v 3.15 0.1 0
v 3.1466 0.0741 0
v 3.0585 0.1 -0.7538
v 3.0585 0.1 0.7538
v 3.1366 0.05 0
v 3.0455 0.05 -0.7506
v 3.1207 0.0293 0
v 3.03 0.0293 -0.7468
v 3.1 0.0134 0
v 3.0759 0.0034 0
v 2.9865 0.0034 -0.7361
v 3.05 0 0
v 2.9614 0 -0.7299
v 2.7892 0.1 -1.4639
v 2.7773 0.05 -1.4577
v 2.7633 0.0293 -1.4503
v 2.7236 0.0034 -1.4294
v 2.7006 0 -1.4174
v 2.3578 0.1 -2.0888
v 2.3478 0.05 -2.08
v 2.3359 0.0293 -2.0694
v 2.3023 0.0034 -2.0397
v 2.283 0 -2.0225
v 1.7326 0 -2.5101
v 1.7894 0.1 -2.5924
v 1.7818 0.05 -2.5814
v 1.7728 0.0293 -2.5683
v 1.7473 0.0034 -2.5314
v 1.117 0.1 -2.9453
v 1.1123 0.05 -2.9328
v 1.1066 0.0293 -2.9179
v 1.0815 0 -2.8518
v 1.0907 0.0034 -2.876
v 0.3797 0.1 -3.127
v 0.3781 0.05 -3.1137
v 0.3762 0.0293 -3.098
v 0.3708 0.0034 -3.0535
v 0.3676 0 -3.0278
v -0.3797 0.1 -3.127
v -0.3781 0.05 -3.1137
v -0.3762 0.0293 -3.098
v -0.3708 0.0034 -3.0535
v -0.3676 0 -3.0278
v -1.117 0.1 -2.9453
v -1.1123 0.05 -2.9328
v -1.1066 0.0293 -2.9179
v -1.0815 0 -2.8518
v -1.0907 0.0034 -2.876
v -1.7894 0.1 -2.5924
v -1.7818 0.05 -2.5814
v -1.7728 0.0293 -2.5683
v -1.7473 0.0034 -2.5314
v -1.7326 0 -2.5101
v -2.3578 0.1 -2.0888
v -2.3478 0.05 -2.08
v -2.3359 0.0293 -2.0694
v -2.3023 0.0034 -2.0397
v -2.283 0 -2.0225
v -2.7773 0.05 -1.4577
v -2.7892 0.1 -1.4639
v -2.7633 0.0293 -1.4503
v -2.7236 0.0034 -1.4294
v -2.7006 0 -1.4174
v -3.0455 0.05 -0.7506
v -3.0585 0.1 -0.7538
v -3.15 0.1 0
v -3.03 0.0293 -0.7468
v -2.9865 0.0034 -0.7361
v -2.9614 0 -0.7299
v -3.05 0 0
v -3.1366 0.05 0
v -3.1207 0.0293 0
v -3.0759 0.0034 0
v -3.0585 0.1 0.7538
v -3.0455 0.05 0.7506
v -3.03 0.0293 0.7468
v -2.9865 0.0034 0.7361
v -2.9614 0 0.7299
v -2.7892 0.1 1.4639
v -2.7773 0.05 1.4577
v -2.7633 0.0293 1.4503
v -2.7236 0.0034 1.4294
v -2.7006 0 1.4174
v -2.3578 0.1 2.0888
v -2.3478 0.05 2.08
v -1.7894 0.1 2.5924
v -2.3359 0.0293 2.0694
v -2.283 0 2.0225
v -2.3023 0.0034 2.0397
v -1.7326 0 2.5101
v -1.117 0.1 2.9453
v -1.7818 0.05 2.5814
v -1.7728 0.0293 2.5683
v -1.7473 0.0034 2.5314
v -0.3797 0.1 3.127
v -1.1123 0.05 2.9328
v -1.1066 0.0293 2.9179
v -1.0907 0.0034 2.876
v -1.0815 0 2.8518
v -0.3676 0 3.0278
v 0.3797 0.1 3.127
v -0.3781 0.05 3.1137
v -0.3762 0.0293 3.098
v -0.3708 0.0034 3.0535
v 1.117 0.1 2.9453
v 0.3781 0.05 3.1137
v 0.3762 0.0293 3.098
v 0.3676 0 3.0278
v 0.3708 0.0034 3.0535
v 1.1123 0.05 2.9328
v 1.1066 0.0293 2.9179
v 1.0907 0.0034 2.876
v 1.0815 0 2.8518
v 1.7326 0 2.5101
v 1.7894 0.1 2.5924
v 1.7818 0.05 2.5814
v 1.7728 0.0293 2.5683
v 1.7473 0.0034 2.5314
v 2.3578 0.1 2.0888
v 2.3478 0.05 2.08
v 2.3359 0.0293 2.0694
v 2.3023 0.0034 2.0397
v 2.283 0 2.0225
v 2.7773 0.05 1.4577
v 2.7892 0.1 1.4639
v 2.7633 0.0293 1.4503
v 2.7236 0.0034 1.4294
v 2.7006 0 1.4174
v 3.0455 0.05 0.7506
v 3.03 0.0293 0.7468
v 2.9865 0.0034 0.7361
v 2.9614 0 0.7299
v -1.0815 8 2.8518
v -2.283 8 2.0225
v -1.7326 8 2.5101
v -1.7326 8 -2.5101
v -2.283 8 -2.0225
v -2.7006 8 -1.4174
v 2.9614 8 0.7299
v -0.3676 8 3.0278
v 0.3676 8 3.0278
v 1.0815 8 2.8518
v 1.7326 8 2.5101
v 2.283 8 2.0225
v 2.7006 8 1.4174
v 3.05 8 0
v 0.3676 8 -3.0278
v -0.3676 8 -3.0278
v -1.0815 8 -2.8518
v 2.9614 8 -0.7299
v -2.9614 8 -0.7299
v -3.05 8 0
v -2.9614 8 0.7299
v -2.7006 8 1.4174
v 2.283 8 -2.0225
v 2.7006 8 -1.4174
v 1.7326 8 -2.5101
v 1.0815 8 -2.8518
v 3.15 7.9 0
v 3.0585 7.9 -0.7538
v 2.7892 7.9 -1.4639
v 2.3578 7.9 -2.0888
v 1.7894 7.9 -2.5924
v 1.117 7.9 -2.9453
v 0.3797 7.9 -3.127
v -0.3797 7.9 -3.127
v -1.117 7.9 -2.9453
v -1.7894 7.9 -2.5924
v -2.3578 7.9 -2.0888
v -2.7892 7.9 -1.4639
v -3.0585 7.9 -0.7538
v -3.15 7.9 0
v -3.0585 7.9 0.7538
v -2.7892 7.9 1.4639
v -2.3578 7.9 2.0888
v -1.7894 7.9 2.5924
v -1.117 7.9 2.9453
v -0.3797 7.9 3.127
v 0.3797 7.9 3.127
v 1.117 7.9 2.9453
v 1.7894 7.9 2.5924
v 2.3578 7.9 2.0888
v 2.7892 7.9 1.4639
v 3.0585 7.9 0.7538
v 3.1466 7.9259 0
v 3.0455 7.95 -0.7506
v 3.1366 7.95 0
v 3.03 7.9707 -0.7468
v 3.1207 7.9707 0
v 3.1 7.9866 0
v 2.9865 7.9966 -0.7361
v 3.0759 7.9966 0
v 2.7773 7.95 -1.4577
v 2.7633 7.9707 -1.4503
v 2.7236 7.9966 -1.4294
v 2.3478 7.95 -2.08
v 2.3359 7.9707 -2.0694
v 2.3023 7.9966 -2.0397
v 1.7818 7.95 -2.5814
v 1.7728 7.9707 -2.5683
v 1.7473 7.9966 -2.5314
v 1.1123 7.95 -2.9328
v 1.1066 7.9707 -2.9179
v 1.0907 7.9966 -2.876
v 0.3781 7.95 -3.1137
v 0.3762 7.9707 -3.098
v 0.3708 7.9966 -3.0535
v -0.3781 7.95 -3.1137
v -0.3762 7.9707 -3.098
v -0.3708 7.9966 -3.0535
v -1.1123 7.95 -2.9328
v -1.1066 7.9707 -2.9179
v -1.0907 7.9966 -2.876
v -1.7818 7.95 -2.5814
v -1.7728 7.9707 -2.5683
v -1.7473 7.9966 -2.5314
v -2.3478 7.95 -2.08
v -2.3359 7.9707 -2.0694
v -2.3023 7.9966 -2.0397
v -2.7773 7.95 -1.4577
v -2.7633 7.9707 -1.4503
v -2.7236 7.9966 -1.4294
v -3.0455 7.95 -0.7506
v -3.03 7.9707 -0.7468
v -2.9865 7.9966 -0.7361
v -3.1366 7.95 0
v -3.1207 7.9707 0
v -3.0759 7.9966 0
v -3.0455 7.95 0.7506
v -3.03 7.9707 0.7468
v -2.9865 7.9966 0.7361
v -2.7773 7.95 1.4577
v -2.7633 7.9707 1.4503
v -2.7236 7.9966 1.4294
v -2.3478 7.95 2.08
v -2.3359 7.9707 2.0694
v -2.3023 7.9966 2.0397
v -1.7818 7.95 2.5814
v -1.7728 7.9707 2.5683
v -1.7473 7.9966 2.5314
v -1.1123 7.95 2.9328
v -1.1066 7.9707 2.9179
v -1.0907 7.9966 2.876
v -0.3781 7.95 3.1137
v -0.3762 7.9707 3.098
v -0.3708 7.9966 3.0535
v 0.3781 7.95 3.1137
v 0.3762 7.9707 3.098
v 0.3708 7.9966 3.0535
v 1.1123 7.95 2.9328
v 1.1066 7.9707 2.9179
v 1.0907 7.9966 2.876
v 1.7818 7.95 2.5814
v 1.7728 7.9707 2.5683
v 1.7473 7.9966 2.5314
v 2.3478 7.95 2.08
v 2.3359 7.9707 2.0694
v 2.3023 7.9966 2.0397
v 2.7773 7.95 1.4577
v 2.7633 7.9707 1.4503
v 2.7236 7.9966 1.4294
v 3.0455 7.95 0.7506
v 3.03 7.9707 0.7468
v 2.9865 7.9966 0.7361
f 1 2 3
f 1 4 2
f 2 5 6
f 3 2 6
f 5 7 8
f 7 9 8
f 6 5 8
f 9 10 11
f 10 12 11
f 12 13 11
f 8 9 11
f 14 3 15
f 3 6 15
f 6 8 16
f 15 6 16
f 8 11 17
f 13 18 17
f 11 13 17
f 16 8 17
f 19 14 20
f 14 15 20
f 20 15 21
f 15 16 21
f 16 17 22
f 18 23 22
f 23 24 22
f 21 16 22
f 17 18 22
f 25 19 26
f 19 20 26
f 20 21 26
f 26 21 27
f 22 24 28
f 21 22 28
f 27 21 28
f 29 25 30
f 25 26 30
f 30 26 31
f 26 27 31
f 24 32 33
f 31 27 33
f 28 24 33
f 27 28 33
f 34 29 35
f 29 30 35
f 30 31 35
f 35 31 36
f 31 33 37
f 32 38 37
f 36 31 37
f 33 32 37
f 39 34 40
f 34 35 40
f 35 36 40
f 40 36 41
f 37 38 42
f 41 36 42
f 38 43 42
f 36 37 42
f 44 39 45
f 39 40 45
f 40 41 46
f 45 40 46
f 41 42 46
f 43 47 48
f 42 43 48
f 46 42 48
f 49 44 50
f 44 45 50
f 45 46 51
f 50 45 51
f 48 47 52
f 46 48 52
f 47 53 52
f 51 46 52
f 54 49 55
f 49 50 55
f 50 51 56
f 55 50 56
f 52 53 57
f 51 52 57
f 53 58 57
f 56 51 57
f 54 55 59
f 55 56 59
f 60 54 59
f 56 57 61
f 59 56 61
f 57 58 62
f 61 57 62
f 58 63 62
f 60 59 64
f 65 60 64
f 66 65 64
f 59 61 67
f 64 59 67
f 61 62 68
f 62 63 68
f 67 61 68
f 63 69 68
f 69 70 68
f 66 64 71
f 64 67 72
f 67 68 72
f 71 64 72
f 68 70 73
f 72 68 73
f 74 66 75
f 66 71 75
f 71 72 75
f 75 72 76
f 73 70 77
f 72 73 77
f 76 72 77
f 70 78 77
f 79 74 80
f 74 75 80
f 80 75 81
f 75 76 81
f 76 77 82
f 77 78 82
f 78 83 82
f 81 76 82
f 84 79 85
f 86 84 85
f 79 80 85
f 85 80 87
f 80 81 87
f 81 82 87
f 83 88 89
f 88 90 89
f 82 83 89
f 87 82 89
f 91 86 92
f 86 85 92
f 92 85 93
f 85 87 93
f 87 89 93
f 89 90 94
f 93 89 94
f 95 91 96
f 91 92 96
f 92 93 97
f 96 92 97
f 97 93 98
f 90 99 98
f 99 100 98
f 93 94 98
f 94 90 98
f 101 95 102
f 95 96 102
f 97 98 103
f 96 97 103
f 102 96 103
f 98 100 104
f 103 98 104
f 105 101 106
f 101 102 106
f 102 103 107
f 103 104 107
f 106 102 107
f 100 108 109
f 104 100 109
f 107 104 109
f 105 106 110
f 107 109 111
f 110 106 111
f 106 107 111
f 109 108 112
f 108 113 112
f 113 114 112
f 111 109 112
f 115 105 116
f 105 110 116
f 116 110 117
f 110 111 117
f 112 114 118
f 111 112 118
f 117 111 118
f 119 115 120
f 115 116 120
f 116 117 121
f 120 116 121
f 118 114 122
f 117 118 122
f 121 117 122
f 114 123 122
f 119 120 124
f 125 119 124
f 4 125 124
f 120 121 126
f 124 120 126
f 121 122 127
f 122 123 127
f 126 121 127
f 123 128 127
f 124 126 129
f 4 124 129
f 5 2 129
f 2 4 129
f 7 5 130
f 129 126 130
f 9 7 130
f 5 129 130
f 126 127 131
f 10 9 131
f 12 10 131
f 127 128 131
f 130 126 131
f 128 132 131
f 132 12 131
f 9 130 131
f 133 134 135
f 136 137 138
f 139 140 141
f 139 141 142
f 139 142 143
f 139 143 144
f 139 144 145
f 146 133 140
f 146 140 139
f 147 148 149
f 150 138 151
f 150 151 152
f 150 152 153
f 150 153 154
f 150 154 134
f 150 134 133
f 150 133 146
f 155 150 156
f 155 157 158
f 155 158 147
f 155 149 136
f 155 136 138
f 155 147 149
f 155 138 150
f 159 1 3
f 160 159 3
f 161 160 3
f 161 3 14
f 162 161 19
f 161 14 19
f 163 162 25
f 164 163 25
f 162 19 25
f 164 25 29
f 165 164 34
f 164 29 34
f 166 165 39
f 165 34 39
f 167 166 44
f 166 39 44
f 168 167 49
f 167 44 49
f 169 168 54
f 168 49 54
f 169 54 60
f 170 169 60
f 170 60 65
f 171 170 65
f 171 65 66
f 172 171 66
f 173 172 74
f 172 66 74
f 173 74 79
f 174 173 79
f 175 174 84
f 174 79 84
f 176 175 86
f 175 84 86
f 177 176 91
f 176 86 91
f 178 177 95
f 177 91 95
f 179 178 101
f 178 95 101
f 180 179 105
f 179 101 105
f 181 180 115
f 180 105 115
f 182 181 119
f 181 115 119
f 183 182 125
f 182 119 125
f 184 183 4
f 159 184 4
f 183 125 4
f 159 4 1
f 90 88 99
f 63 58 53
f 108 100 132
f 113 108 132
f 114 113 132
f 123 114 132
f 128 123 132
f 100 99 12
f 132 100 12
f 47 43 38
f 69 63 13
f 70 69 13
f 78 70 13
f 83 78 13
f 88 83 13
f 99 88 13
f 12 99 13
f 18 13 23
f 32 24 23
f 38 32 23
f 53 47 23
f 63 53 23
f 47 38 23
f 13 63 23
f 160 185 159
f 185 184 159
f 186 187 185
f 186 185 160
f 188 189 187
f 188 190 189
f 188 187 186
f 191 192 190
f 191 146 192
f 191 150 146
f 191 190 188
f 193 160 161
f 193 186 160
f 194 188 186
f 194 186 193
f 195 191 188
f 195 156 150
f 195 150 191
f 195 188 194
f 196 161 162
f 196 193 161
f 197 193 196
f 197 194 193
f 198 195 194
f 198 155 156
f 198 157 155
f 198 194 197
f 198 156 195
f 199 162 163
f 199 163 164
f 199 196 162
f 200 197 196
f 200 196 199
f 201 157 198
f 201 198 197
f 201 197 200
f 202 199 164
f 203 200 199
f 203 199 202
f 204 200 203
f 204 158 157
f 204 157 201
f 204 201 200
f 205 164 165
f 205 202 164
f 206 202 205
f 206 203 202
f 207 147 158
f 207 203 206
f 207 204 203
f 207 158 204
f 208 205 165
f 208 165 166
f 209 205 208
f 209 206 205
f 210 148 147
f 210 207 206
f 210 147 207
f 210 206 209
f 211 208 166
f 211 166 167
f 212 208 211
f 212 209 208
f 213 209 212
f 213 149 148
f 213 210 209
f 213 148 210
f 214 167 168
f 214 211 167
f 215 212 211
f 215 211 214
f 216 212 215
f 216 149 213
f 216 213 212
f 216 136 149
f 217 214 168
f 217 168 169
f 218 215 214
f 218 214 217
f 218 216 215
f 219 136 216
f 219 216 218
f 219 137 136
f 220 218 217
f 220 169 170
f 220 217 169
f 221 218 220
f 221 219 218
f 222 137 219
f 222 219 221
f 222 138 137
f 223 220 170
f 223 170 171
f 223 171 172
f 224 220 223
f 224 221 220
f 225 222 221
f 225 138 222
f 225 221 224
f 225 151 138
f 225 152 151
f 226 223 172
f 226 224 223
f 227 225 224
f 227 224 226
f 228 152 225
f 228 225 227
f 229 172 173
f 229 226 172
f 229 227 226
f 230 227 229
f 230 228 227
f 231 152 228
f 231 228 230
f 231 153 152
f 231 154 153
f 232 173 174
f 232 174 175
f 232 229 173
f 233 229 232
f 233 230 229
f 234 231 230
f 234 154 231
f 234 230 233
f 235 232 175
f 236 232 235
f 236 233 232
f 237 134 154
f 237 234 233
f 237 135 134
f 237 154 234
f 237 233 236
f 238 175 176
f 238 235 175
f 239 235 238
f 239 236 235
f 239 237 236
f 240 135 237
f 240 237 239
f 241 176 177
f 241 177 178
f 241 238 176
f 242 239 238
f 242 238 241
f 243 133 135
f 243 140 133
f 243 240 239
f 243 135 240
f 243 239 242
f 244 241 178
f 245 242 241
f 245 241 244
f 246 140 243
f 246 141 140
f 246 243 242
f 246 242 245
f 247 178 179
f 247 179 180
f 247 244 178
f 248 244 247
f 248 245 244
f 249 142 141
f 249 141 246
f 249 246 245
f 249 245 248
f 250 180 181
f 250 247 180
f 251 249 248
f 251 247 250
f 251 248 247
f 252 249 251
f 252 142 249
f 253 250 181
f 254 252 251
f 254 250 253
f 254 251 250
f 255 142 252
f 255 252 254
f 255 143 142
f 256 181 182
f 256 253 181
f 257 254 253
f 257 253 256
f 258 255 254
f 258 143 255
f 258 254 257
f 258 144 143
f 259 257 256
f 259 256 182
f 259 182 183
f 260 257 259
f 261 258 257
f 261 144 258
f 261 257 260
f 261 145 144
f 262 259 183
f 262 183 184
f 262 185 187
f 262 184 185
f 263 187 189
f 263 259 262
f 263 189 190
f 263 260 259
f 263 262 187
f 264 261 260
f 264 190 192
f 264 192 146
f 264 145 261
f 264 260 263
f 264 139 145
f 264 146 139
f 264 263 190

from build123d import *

# Parameters (mm, degrees)
SKETCH_1_R      = 3.15
EXTRUDE_1_DEPTH = 8
FILLET_1_R      = 0.1
FILLET_2_R      = 0.1


with BuildPart() as part:
    # Эскиз1 → Бобышка-Вытянуть1 (new body)
    with BuildSketch(Plane(origin=(0, 0, 0), x_dir=(1, 0, 0), z_dir=(0, 1, 0))):
        Circle(SKETCH_1_R)
    extrude(amount=EXTRUDE_1_DEPTH)

    # Скругление1
    fillet_1_edges = [part.edges().sort_by_distance(p)[0] for p in [
        (-3.15, 8, 0),
    ]]
    fillet(fillet_1_edges, radius=FILLET_1_R)

    # Скругление2
    fillet_2_edges = [part.edges().sort_by_distance(p)[0] for p in [
        (-3.15, 0, 0),
    ]]
    fillet(fillet_2_edges, radius=FILLET_2_R)


solid = part.part
